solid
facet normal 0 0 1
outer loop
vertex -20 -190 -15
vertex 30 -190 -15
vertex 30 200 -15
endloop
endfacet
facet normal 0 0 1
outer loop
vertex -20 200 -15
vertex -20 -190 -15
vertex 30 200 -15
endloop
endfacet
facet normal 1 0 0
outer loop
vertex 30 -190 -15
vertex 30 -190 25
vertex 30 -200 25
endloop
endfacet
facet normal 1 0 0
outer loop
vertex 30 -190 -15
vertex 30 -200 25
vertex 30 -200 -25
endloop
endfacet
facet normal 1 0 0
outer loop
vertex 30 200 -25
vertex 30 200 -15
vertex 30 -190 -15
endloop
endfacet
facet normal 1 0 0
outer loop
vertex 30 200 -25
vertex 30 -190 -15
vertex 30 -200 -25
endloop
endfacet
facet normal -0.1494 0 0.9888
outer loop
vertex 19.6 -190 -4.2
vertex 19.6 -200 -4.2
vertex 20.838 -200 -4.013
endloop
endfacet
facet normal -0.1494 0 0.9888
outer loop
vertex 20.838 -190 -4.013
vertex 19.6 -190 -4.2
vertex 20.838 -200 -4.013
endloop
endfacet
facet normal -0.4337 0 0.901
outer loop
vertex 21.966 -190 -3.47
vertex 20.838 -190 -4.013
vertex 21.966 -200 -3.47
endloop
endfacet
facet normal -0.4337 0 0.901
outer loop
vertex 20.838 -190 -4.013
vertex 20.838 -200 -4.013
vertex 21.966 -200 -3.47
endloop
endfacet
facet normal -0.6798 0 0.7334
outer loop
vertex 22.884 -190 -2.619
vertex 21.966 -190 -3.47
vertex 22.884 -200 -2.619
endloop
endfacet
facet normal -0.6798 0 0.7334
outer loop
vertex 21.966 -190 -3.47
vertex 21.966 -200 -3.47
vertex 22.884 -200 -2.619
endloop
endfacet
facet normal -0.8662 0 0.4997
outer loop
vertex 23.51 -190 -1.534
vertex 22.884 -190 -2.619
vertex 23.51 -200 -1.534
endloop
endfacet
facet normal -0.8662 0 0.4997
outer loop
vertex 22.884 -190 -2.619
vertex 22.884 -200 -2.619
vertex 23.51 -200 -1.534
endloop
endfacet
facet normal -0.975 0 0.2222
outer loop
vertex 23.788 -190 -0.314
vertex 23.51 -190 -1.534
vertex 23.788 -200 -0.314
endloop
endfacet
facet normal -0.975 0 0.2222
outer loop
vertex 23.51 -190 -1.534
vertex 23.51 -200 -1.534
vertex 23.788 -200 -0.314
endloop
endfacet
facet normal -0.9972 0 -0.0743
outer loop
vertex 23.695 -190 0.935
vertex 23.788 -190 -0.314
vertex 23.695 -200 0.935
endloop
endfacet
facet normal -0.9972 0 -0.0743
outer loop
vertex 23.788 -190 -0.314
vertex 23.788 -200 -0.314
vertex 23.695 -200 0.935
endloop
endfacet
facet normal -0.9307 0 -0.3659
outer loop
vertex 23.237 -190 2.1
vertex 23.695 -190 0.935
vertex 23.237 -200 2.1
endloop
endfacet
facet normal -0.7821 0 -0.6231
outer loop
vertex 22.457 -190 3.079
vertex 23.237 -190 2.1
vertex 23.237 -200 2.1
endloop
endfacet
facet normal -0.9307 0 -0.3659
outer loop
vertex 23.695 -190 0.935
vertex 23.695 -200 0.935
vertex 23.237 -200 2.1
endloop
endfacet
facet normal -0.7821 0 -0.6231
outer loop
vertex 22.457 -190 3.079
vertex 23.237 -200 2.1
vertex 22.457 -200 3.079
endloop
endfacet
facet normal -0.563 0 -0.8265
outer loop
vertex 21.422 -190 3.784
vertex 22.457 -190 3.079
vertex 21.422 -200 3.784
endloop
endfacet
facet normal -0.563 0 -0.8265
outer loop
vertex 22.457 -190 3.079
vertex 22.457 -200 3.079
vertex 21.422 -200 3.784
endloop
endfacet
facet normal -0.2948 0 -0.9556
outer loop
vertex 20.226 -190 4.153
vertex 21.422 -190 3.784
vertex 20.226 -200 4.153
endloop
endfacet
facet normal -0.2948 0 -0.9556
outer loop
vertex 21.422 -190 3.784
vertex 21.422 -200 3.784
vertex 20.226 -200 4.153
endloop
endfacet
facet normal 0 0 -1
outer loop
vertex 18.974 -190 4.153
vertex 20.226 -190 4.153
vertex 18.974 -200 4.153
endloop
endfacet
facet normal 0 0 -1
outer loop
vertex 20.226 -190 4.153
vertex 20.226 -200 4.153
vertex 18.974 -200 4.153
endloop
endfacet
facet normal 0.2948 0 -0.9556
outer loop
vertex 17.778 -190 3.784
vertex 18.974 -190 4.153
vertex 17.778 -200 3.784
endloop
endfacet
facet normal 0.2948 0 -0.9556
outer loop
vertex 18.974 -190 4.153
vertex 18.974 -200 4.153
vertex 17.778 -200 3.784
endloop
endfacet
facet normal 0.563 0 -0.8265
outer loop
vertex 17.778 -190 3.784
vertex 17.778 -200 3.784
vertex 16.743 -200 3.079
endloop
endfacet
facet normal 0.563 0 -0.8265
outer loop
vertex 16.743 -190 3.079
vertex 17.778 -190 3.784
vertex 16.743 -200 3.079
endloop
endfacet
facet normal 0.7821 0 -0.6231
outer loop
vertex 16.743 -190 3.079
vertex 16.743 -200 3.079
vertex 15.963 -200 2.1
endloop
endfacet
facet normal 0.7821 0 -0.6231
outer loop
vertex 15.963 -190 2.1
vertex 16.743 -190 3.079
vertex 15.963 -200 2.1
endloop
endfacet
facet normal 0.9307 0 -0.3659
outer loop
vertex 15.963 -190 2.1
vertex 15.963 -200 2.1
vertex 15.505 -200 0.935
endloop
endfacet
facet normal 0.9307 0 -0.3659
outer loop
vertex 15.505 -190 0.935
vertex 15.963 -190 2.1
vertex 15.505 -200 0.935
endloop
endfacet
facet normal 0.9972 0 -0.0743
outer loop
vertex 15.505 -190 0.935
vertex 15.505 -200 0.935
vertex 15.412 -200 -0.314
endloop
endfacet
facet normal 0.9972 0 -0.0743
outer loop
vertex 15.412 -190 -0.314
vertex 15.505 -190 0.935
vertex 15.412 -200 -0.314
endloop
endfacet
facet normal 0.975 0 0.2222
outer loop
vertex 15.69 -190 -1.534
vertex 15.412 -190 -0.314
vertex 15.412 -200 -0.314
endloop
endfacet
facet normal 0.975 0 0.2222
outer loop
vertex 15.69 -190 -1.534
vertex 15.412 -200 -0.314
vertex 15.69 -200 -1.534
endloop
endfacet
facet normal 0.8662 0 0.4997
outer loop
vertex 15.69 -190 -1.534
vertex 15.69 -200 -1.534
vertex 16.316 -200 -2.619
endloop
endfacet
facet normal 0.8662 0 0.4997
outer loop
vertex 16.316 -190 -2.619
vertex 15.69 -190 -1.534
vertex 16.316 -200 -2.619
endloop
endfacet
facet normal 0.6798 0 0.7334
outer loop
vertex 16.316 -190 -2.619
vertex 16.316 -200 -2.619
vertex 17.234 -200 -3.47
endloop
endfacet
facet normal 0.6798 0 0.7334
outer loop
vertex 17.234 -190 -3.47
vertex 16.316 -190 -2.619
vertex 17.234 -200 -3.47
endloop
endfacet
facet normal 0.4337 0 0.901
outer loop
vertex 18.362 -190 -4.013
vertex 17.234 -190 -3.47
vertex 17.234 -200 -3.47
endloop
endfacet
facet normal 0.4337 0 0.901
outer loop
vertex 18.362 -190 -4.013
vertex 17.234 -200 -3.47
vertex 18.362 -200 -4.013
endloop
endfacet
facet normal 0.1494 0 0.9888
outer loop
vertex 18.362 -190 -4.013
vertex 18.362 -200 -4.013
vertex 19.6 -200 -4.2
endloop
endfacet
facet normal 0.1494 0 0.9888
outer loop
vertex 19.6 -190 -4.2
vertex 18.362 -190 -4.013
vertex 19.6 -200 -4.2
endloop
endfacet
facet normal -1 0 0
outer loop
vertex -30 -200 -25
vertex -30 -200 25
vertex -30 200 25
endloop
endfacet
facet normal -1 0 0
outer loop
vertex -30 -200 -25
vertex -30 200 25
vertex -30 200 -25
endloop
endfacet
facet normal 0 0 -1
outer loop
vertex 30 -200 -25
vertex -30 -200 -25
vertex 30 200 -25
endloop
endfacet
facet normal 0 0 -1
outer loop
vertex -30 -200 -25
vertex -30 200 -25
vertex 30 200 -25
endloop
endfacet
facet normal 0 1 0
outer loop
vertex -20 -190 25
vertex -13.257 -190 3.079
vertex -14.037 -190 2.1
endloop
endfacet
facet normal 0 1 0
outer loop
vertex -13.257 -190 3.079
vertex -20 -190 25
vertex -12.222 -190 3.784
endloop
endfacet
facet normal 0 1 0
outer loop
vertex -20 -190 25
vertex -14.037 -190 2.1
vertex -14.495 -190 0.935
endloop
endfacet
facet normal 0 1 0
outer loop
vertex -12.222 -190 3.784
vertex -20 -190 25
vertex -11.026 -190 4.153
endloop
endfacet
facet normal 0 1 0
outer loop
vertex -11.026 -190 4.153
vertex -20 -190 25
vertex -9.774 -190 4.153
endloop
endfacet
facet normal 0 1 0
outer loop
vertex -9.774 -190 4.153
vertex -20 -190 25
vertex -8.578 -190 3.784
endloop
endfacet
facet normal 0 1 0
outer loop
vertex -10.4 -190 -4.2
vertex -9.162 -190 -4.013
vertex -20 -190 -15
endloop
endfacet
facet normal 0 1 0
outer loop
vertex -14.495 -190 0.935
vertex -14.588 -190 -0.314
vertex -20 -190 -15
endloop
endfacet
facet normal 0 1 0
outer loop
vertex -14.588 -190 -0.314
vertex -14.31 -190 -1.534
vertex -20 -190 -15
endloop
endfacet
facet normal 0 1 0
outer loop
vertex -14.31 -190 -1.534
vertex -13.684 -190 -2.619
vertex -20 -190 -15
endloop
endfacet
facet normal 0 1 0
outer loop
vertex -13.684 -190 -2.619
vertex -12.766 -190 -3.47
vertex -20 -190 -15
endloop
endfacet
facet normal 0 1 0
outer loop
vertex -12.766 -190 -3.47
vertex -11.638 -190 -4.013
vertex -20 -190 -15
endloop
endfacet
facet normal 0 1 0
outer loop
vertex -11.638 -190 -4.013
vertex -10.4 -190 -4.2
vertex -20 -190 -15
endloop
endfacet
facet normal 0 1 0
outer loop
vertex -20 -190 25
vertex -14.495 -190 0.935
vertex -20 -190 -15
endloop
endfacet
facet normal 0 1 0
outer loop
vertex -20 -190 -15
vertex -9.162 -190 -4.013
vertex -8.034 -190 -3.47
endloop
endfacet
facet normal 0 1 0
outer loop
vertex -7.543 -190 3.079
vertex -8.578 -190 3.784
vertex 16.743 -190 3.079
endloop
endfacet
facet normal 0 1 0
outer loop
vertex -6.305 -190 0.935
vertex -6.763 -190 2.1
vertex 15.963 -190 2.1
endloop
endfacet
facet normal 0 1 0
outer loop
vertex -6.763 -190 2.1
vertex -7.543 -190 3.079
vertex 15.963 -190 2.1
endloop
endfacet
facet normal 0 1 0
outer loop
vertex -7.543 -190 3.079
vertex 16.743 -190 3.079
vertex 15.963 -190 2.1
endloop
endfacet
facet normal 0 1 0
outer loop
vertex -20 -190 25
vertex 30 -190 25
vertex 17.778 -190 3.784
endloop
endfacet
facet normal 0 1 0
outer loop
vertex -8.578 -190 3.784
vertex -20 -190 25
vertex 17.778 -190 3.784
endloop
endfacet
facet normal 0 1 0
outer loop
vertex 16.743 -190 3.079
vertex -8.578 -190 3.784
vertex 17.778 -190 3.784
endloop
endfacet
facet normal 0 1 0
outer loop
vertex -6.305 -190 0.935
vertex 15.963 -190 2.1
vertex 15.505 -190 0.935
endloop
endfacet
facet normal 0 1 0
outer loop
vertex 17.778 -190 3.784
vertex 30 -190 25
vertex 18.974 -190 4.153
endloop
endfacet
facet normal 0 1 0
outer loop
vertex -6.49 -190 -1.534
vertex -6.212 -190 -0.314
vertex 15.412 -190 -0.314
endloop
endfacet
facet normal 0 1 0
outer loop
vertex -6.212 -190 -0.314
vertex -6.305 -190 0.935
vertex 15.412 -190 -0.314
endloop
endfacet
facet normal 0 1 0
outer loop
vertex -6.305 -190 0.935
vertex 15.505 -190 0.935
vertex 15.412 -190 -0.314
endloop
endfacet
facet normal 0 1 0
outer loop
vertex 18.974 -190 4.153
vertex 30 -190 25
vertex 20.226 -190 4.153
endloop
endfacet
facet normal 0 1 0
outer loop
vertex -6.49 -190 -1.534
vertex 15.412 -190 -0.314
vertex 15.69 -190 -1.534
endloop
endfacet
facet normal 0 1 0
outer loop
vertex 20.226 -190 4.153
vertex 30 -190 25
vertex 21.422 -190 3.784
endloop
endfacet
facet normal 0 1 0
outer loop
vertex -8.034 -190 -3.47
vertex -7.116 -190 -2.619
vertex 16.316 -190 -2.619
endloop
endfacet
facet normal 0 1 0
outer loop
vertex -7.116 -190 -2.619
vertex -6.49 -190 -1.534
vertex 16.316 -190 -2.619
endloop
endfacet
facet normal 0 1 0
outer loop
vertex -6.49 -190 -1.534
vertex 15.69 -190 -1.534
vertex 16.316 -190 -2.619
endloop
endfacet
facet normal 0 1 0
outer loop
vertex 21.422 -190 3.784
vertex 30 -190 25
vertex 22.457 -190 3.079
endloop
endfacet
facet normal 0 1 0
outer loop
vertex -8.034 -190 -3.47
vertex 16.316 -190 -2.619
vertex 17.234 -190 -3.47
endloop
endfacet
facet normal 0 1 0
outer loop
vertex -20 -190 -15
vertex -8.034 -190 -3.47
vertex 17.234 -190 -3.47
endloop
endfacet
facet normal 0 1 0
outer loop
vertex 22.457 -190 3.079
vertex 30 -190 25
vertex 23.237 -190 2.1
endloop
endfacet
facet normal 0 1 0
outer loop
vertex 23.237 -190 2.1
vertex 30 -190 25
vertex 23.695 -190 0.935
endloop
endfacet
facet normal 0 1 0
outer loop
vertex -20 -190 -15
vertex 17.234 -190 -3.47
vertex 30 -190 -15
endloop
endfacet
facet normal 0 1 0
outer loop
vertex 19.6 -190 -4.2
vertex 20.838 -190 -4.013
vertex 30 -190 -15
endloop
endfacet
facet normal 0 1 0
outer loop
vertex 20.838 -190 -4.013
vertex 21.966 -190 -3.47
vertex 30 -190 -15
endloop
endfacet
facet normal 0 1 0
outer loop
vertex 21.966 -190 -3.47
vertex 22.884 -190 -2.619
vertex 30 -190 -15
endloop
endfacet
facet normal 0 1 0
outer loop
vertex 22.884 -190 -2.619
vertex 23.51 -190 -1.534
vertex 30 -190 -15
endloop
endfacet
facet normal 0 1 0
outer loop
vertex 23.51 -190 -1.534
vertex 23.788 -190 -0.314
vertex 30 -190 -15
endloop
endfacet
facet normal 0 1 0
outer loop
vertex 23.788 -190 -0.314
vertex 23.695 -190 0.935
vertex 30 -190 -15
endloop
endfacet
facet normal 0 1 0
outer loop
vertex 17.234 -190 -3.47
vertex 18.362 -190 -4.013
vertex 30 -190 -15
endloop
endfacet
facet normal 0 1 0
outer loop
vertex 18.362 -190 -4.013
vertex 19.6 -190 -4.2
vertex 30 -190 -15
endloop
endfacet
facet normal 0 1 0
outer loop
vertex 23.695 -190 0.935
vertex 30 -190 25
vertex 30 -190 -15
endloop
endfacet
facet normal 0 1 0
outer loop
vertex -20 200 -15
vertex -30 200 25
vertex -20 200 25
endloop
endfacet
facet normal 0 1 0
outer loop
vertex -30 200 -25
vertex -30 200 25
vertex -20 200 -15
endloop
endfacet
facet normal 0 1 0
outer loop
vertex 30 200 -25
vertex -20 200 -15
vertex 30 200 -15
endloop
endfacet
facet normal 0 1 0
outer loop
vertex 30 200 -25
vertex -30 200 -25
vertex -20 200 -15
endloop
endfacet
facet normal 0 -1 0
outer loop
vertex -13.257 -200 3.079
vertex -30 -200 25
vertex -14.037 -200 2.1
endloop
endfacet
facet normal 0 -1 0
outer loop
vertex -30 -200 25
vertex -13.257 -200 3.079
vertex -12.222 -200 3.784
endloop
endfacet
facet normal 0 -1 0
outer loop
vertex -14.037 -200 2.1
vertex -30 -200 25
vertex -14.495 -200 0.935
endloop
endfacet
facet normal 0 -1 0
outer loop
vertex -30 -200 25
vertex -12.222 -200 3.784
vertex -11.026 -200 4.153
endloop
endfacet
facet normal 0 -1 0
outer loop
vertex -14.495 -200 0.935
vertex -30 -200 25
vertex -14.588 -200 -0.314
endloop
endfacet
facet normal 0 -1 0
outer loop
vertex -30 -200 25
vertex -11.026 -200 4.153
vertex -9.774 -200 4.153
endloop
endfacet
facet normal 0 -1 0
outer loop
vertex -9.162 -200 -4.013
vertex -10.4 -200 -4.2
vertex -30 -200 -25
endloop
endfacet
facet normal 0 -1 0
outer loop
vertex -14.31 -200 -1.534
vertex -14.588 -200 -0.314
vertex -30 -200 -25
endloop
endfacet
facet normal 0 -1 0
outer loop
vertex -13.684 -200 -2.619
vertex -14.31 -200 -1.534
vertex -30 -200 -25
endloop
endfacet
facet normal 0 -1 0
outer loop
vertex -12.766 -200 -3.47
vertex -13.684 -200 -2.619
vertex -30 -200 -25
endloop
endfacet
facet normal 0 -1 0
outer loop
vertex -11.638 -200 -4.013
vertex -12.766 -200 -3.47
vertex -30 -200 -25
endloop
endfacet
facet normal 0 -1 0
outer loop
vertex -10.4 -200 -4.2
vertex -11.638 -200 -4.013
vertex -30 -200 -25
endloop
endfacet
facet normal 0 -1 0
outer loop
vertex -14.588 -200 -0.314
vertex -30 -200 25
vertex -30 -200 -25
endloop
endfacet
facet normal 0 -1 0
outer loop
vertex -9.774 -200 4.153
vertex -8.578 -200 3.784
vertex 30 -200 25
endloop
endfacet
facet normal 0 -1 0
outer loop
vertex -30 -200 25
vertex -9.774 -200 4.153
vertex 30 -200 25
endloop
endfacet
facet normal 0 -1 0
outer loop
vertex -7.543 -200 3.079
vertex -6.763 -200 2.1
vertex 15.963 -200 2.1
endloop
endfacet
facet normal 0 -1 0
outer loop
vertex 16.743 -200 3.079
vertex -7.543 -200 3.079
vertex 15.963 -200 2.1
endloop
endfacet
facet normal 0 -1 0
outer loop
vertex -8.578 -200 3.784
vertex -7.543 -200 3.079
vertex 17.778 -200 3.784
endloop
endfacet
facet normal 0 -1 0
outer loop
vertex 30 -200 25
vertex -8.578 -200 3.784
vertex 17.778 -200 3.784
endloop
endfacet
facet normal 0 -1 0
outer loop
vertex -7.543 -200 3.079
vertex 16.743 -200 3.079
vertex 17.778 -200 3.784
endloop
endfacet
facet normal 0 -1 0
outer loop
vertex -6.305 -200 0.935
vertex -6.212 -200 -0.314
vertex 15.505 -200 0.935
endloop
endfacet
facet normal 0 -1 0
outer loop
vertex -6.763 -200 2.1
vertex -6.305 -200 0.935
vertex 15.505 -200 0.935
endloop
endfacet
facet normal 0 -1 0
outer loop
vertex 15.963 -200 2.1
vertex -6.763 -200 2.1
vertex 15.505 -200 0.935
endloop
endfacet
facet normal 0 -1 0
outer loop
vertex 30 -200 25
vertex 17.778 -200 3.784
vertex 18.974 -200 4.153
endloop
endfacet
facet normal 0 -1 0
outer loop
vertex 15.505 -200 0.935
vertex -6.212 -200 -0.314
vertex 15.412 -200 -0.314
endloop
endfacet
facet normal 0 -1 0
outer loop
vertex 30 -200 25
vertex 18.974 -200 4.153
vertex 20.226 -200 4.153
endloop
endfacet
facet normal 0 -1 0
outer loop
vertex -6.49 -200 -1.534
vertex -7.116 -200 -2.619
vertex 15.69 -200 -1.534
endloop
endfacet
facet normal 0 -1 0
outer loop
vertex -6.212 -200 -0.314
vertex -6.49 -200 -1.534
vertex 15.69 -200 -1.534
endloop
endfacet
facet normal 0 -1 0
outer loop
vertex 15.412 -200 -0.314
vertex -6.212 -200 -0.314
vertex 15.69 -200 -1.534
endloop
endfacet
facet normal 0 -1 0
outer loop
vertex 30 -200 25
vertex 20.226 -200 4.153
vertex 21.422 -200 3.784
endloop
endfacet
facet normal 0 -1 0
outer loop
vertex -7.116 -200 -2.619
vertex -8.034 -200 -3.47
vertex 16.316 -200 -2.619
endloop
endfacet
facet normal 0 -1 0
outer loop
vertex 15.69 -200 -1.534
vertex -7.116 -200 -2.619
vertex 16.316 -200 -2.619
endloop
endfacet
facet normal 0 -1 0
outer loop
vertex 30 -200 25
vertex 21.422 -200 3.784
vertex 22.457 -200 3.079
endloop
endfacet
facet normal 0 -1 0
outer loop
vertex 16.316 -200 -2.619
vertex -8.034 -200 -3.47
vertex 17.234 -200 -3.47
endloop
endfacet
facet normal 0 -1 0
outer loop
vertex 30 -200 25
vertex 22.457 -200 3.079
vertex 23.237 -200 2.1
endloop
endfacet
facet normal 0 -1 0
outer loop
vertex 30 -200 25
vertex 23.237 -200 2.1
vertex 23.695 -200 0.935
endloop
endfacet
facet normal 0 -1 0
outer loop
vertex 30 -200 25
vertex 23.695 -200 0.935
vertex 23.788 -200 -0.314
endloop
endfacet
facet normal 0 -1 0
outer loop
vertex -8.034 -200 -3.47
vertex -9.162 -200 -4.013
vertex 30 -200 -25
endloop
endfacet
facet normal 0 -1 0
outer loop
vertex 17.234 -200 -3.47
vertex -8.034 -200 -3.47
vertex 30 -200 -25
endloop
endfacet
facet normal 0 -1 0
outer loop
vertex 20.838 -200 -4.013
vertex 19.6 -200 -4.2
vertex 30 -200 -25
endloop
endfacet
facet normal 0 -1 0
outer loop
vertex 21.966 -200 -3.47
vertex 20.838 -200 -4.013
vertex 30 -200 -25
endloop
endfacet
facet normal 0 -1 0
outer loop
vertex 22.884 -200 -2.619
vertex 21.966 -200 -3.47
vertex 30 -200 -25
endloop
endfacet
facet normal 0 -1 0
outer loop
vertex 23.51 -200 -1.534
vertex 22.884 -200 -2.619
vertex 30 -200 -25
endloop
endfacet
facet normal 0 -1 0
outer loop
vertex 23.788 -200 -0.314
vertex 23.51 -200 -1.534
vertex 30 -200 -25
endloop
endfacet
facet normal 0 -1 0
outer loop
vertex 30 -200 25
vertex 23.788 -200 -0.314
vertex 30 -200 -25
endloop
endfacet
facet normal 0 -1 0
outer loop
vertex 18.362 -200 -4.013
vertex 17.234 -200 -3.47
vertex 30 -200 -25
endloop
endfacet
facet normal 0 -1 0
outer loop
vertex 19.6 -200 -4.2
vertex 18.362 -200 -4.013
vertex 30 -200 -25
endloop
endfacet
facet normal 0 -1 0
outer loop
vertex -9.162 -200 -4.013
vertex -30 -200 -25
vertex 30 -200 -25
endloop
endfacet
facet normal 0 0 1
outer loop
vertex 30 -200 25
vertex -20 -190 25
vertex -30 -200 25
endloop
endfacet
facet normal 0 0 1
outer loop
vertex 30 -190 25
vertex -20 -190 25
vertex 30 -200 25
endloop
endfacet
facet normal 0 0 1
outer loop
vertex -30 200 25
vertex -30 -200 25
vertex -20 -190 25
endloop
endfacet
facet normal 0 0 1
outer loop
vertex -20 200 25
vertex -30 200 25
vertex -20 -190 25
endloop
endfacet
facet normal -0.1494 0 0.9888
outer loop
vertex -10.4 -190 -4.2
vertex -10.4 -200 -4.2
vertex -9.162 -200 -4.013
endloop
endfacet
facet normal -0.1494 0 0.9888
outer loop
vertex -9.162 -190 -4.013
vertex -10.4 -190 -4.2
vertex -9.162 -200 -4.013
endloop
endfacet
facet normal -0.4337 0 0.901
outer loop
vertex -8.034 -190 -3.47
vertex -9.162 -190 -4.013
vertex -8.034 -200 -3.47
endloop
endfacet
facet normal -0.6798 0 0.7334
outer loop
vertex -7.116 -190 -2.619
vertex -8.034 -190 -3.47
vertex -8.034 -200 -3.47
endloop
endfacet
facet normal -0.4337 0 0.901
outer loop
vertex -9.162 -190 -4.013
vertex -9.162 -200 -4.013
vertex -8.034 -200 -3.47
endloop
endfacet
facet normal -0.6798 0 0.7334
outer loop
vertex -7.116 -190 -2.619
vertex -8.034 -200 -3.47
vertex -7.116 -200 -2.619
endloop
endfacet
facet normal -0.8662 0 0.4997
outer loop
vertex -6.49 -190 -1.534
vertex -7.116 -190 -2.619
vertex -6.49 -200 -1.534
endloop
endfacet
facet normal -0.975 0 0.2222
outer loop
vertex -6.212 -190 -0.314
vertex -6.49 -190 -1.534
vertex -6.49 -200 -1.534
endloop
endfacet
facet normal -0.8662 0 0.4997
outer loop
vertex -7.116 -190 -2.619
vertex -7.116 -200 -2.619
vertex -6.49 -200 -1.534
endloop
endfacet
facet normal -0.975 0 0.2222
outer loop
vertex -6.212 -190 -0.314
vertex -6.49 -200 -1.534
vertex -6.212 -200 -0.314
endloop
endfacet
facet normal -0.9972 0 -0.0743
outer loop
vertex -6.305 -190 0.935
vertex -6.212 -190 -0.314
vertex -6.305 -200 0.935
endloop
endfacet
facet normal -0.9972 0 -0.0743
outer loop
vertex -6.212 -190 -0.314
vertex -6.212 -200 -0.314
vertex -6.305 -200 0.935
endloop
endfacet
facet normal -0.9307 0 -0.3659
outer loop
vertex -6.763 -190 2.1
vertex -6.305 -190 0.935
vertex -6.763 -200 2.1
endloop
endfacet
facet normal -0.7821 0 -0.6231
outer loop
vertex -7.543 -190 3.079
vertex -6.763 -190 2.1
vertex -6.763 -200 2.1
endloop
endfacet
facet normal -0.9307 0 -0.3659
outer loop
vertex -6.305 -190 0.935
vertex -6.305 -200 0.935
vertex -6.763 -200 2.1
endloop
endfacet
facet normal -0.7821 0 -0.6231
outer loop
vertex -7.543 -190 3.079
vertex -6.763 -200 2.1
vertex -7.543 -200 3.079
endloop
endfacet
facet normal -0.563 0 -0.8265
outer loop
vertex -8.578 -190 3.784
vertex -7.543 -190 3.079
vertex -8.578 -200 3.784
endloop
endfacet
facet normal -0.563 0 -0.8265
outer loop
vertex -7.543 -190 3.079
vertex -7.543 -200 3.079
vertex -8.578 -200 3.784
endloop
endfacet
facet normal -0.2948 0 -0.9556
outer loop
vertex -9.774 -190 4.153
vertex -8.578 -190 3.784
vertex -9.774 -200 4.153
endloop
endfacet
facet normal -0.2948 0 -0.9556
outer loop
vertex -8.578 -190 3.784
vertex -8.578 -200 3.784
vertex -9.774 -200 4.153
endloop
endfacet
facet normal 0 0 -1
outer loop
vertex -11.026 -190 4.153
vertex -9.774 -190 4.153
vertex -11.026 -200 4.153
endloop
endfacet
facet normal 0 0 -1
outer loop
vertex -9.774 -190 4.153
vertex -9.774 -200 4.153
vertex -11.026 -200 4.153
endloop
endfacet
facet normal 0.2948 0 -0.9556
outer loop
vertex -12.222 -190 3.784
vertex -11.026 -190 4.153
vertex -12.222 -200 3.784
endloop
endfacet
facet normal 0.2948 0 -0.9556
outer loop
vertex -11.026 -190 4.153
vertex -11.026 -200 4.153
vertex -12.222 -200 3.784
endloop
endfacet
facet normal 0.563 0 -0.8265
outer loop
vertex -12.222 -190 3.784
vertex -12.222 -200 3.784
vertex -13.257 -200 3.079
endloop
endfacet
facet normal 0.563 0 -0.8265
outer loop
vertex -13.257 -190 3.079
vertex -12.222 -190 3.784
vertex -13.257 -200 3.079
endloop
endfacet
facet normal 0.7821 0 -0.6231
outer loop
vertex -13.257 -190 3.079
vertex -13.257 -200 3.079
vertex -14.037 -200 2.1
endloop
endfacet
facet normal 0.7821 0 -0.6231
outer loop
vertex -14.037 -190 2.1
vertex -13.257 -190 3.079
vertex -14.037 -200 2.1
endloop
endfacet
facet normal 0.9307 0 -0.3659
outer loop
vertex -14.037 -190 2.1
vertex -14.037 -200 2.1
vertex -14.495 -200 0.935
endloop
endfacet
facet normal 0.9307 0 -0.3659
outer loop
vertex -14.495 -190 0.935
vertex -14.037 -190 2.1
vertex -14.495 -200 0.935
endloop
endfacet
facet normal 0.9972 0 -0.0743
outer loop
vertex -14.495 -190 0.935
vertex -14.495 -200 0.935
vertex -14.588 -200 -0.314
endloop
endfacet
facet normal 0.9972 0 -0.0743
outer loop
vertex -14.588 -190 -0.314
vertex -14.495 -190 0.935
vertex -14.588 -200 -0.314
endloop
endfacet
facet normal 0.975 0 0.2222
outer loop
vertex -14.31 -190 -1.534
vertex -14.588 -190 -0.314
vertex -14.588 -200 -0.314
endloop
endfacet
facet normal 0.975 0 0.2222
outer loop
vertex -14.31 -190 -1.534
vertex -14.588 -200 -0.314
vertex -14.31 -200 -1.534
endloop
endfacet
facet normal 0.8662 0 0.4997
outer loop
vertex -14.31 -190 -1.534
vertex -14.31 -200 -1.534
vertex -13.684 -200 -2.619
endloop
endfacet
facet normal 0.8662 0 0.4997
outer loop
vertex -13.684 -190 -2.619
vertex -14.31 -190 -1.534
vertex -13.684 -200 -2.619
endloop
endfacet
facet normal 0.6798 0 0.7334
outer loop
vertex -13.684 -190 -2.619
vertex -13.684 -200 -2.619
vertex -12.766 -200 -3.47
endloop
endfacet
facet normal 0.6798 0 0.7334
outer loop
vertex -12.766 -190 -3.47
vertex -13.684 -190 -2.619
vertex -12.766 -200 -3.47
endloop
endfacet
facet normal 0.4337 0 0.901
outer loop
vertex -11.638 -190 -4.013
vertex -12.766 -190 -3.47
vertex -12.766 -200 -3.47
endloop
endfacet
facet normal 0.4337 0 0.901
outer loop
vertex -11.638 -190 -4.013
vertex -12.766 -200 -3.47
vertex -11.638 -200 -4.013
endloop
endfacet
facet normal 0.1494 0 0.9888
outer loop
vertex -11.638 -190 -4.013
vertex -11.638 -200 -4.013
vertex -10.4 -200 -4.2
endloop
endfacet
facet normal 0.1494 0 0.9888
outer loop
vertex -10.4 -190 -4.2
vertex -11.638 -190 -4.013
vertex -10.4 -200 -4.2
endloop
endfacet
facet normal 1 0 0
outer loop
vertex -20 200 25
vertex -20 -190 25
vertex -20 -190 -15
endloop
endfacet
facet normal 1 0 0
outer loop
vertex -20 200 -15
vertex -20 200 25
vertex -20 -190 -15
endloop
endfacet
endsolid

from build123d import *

# Parameters (mm, degrees)
SKETCH1_W           = 60
SKETCH1_H           = 50
BOSS_EXTRUDE1_DEPTH = 200
SKETCH2_W           = 40
SKETCH2_H           = 390
CUT_EXTRUDE1_DEPTH  = 50
SKETCH4_R           = 4.2
CUT_EXTRUDE3_DEPTH  = 402.901729282


with BuildPart() as part:
    # Sketch1 → Boss-Extrude1 (new, symmetric)
    with BuildSketch(Plane(origin=(0, 0, 0), x_dir=(1, 0, 0), z_dir=(0, 1, 0))):
        Rectangle(SKETCH1_W, SKETCH1_H)
    extrude(amount=BOSS_EXTRUDE1_DEPTH, both=True)

    # Sketch2 → Cut-Extrude1 (cut)
    with BuildSketch(Plane(origin=(30, 0, 0), x_dir=(0, 0, -1), z_dir=(1, 0, 0))):
        with Locations((-5, 5)):
            Rectangle(SKETCH2_W, SKETCH2_H)
    extrude(amount=-CUT_EXTRUDE1_DEPTH, mode=Mode.SUBTRACT)

    # Sketch4 → Cut-Extrude3 (cut, through all)
    with BuildSketch(Plane.XZ.offset(200)):
        with Locations(Location((-10.4, 0, 0), (0, 0, 270))):
            Circle(SKETCH4_R)
        with Locations(Location((19.6, 0, 0), (0, 0, 270))):
            Circle(SKETCH4_R)
    extrude(amount=-CUT_EXTRUDE3_DEPTH, mode=Mode.SUBTRACT)


solid = part.part
